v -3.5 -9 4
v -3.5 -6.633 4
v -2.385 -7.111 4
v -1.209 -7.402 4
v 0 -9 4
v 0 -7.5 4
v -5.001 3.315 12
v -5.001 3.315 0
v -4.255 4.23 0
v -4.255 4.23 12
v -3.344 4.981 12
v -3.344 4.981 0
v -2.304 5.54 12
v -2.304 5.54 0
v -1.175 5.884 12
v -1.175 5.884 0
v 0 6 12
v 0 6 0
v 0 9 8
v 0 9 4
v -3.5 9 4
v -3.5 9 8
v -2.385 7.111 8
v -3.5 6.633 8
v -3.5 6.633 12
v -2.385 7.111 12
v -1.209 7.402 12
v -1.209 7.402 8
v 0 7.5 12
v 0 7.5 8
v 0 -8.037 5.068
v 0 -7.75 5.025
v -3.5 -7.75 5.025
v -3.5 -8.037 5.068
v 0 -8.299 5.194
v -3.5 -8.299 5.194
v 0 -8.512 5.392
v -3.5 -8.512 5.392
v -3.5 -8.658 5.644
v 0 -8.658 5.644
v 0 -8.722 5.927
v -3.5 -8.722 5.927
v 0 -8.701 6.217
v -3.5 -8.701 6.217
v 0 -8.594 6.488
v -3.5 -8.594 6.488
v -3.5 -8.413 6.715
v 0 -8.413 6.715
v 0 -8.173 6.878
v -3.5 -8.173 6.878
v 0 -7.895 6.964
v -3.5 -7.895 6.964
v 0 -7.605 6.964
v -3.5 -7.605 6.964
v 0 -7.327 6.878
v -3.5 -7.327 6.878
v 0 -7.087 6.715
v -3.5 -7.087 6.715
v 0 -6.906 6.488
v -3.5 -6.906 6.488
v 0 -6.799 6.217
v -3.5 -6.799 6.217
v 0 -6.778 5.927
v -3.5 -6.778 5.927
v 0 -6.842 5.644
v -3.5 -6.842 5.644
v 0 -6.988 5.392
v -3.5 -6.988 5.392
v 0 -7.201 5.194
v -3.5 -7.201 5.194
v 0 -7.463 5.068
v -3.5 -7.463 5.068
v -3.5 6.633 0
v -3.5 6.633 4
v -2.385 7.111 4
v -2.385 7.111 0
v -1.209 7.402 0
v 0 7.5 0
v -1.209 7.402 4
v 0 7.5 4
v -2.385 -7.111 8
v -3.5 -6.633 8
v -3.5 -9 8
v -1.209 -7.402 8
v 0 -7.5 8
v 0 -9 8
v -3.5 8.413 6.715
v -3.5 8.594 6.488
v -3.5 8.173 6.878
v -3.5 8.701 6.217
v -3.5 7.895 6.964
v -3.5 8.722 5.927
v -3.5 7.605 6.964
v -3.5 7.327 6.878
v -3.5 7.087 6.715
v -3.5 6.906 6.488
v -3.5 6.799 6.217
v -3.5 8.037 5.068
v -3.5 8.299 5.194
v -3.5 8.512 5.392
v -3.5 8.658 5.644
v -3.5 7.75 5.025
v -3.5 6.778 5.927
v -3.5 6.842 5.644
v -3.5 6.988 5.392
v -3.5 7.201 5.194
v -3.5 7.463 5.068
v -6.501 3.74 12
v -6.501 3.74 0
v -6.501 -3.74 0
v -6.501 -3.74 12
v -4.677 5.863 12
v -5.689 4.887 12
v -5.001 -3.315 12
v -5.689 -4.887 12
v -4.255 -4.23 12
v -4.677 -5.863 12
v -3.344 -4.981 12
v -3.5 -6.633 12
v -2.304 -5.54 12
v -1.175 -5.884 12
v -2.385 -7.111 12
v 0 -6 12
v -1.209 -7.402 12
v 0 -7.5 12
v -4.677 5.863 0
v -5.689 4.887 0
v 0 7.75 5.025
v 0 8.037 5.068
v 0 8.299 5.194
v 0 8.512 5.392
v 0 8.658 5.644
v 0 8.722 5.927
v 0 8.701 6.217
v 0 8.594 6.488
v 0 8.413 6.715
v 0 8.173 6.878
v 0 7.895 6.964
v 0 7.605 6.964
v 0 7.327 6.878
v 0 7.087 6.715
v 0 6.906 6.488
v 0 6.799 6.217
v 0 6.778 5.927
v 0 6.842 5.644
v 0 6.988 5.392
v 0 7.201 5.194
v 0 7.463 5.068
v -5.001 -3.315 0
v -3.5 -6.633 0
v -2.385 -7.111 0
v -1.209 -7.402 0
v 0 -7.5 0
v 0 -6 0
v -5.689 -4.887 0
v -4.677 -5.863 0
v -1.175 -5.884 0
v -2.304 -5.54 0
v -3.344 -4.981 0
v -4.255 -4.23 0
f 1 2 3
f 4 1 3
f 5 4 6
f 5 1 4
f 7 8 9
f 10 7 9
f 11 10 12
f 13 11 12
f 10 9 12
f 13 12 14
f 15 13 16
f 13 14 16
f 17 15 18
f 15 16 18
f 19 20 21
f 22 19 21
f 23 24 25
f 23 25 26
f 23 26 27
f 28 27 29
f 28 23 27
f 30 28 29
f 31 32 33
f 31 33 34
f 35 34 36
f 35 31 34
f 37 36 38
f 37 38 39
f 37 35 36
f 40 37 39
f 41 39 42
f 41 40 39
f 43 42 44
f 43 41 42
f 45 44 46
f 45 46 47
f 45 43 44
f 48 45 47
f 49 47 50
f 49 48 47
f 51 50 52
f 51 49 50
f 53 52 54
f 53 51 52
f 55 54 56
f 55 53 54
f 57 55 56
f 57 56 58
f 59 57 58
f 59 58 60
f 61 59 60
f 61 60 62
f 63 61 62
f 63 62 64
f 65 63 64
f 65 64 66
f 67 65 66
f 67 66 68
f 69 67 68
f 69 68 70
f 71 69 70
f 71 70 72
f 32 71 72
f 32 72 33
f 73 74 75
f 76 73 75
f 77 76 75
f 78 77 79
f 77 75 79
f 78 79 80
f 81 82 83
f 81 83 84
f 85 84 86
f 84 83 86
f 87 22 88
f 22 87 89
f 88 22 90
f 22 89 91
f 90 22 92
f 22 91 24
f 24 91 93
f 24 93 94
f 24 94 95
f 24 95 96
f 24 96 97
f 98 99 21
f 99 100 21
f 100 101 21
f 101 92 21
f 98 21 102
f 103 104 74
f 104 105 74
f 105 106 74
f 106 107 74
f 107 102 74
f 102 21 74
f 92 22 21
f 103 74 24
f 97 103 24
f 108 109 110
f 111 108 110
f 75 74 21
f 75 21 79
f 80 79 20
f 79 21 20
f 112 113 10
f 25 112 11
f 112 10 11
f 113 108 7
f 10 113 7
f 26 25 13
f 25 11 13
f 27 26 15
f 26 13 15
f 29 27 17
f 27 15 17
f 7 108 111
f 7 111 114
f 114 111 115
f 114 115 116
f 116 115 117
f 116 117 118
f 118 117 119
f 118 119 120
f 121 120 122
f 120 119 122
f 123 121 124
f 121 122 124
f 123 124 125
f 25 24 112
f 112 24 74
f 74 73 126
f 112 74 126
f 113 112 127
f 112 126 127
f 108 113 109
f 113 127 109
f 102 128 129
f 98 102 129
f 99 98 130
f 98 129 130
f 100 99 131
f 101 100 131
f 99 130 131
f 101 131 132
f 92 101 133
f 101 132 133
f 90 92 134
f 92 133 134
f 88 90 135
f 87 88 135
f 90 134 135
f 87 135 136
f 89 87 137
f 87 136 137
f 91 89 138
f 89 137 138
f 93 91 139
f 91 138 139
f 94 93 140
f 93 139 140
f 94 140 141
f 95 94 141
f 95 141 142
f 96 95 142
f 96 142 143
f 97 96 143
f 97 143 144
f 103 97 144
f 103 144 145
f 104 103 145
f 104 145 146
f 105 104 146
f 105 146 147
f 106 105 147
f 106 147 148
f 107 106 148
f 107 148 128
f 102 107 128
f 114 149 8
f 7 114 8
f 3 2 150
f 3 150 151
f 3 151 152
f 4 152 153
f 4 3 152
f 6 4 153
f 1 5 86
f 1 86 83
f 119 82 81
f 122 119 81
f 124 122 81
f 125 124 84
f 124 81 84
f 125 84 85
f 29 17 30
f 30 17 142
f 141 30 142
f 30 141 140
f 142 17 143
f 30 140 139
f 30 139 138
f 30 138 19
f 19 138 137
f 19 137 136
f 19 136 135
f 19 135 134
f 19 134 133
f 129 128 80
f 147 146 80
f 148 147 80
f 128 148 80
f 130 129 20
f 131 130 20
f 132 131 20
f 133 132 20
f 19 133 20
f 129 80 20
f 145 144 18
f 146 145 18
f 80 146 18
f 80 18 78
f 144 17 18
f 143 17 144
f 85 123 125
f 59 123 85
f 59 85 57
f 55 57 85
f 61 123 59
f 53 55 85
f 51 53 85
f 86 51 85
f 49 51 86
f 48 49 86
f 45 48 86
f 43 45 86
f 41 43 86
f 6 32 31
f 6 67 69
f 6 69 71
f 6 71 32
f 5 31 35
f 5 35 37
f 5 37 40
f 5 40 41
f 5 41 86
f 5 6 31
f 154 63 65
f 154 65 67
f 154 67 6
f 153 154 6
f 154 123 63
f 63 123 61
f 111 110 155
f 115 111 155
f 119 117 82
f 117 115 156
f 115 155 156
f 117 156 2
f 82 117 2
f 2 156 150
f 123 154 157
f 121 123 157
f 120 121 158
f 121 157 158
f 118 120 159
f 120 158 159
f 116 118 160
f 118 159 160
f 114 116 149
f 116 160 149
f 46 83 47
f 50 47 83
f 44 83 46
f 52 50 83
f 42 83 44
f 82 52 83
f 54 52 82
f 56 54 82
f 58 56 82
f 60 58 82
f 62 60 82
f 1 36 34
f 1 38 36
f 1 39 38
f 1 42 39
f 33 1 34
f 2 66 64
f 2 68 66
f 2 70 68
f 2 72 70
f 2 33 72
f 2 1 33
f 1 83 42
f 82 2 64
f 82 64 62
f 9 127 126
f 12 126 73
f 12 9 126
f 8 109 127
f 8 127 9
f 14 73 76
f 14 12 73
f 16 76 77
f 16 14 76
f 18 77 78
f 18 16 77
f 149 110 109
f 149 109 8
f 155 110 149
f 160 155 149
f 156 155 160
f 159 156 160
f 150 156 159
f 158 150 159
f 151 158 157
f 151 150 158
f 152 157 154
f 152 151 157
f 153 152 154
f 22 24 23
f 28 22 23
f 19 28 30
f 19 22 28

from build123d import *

# Parameters (mm, degrees)
BOSS_EXTRUDE2_DEPTH  = 12
BOSS_EXTRUDE3_START  = -12
BOSS_EXTRUDE3_DEPTH  = 12
CUT_EXTRUDE6_START   = -4
CUT_EXTRUDE6_DEPTH   = 4
CUT_EXTRUDE7_REACH   = 18.348
SKETCH4_R            = 0.975
MIRROR2_START        = -4
MIRROR2_COPY_1_DEPTH = 4


# Read off the part's stored shape, not the designer's step: Boss-Extrude3
with BuildPart() as part:
    # Sketch1 → Boss-Extrude2 (new body)
    with BuildSketch(Plane.XY):
        with BuildLine():
            Line((0, 6), (0, 7.5))
            ThreePointArc((0, 7.5), (-3.75510396, 6.492241081), (-6.501077384, 3.739785134))
            Line((-6.501077384, 3.739785134), (-6.501077384, -3.739785134))
            ThreePointArc((-6.501077384, -3.739785134), (-3.75510396, -6.492241081), (0, -7.5))
            Line((0, -7.5), (0, -6))
            ThreePointArc((0, -6), (-2.838133189, -5.286303056), (-5.001077384, -3.315))
            ThreePointArc((-5.001077384, -3.315), (-6, 0), (-5.001077384, 3.315))
            ThreePointArc((-5.001077384, 3.315), (-2.838133189, 5.286303056), (0, 6))
        make_face()
        with BuildLine():
            Line((-5.001077384, -3.315), (-5.001077384, 3.315))
            ThreePointArc((-5.001077384, 3.315), (-6, 0), (-5.001077384, -3.315))
        make_face()
    extrude(amount=BOSS_EXTRUDE2_DEPTH)

    # Boss-Extrude3 outline → Boss-Extrude3 (add)
    with BuildSketch(Plane.XY.offset(12).offset(BOSS_EXTRUDE3_START)):
        with BuildLine():
            ThreePointArc((-3.5, 6.633249581), (-1.802862744, 7.280088319), (0, 7.5))
            Line((0, 7.5), (0, 9))
            Line((0, 9), (-3.5, 9))
            Line((-3.5, 9), (-3.5, 6.633249581))
        make_face()
    boss_extrude3 = extrude(amount=BOSS_EXTRUDE3_DEPTH)

    # Sketch3 → Cut-Extrude6 (cut)
    with BuildSketch(Plane.XY.offset(12).offset(CUT_EXTRUDE6_START)):
        with BuildLine():
            Line((-4.617876388, 10.846765639), (-4.617876388, 5.909756142))
            ThreePointArc((-4.617876388, 5.909756142), (-1.858071818, 7.266193578), (1.214101671, 7.401078106))
            Line((1.214101671, 7.401078106), (1.214101671, 10.846765639))
            Line((1.214101671, 10.846765639), (-4.617876388, 10.846765639))
        make_face()
    cut_extrude6 = extrude(amount=CUT_EXTRUDE6_DEPTH, mode=Mode.SUBTRACT)

    # Mirror1: Cut-Extrude6 across plane
    add(cut_extrude6.mirror(Plane.XY.offset(6)), mode=Mode.SUBTRACT)

    # Sketch4 → Cut-Extrude7 (cut, up to next)
    with BuildSketch(Plane(origin=(0, 0, 0), x_dir=(0, 0, -1), z_dir=(1, 0, 0)), mode=Mode.PRIVATE) as cut_extrude7_sk1:
        with Locations((-6, 7.75)):
            Circle(SKETCH4_R)
    cut_extrude7_tool1 = extrude(cut_extrude7_sk1.sketch, amount=-CUT_EXTRUDE7_REACH, mode=Mode.PRIVATE) & part.part
    cut_extrude7 = cut_extrude7_tool1.solids().sort_by_distance((0, 7.75, 6))[0]
    add(cut_extrude7, mode=Mode.SUBTRACT)

    # Mirror2: Boss-Extrude3, Cut-Extrude6, Cut-Extrude7 across plane
    add(boss_extrude3.mirror(Plane.ZX))
    add(cut_extrude6.mirror(Plane.ZX), mode=Mode.SUBTRACT)
    add(cut_extrude7.mirror(Plane.ZX), mode=Mode.SUBTRACT)

    # Mirror2 copy 1 sketch → Mirror2 copy 1 (cut)
    with BuildSketch(Plane(origin=(0, 0, 0), x_dir=(1, 0, 0), z_dir=(0, 0, -1)).offset(MIRROR2_START)):
        with BuildLine():
            Line((-4.617876388, 10.846765639), (-4.617876388, 5.909756142))
            ThreePointArc((-4.617876388, 5.909756142), (-1.858071818, 7.266193578), (1.214101671, 7.401078106))
            Line((1.214101671, 7.401078106), (1.214101671, 10.846765639))
            Line((1.214101671, 10.846765639), (-4.617876388, 10.846765639))
        make_face()
    extrude(amount=MIRROR2_COPY_1_DEPTH, mode=Mode.SUBTRACT)


solid = part.part
